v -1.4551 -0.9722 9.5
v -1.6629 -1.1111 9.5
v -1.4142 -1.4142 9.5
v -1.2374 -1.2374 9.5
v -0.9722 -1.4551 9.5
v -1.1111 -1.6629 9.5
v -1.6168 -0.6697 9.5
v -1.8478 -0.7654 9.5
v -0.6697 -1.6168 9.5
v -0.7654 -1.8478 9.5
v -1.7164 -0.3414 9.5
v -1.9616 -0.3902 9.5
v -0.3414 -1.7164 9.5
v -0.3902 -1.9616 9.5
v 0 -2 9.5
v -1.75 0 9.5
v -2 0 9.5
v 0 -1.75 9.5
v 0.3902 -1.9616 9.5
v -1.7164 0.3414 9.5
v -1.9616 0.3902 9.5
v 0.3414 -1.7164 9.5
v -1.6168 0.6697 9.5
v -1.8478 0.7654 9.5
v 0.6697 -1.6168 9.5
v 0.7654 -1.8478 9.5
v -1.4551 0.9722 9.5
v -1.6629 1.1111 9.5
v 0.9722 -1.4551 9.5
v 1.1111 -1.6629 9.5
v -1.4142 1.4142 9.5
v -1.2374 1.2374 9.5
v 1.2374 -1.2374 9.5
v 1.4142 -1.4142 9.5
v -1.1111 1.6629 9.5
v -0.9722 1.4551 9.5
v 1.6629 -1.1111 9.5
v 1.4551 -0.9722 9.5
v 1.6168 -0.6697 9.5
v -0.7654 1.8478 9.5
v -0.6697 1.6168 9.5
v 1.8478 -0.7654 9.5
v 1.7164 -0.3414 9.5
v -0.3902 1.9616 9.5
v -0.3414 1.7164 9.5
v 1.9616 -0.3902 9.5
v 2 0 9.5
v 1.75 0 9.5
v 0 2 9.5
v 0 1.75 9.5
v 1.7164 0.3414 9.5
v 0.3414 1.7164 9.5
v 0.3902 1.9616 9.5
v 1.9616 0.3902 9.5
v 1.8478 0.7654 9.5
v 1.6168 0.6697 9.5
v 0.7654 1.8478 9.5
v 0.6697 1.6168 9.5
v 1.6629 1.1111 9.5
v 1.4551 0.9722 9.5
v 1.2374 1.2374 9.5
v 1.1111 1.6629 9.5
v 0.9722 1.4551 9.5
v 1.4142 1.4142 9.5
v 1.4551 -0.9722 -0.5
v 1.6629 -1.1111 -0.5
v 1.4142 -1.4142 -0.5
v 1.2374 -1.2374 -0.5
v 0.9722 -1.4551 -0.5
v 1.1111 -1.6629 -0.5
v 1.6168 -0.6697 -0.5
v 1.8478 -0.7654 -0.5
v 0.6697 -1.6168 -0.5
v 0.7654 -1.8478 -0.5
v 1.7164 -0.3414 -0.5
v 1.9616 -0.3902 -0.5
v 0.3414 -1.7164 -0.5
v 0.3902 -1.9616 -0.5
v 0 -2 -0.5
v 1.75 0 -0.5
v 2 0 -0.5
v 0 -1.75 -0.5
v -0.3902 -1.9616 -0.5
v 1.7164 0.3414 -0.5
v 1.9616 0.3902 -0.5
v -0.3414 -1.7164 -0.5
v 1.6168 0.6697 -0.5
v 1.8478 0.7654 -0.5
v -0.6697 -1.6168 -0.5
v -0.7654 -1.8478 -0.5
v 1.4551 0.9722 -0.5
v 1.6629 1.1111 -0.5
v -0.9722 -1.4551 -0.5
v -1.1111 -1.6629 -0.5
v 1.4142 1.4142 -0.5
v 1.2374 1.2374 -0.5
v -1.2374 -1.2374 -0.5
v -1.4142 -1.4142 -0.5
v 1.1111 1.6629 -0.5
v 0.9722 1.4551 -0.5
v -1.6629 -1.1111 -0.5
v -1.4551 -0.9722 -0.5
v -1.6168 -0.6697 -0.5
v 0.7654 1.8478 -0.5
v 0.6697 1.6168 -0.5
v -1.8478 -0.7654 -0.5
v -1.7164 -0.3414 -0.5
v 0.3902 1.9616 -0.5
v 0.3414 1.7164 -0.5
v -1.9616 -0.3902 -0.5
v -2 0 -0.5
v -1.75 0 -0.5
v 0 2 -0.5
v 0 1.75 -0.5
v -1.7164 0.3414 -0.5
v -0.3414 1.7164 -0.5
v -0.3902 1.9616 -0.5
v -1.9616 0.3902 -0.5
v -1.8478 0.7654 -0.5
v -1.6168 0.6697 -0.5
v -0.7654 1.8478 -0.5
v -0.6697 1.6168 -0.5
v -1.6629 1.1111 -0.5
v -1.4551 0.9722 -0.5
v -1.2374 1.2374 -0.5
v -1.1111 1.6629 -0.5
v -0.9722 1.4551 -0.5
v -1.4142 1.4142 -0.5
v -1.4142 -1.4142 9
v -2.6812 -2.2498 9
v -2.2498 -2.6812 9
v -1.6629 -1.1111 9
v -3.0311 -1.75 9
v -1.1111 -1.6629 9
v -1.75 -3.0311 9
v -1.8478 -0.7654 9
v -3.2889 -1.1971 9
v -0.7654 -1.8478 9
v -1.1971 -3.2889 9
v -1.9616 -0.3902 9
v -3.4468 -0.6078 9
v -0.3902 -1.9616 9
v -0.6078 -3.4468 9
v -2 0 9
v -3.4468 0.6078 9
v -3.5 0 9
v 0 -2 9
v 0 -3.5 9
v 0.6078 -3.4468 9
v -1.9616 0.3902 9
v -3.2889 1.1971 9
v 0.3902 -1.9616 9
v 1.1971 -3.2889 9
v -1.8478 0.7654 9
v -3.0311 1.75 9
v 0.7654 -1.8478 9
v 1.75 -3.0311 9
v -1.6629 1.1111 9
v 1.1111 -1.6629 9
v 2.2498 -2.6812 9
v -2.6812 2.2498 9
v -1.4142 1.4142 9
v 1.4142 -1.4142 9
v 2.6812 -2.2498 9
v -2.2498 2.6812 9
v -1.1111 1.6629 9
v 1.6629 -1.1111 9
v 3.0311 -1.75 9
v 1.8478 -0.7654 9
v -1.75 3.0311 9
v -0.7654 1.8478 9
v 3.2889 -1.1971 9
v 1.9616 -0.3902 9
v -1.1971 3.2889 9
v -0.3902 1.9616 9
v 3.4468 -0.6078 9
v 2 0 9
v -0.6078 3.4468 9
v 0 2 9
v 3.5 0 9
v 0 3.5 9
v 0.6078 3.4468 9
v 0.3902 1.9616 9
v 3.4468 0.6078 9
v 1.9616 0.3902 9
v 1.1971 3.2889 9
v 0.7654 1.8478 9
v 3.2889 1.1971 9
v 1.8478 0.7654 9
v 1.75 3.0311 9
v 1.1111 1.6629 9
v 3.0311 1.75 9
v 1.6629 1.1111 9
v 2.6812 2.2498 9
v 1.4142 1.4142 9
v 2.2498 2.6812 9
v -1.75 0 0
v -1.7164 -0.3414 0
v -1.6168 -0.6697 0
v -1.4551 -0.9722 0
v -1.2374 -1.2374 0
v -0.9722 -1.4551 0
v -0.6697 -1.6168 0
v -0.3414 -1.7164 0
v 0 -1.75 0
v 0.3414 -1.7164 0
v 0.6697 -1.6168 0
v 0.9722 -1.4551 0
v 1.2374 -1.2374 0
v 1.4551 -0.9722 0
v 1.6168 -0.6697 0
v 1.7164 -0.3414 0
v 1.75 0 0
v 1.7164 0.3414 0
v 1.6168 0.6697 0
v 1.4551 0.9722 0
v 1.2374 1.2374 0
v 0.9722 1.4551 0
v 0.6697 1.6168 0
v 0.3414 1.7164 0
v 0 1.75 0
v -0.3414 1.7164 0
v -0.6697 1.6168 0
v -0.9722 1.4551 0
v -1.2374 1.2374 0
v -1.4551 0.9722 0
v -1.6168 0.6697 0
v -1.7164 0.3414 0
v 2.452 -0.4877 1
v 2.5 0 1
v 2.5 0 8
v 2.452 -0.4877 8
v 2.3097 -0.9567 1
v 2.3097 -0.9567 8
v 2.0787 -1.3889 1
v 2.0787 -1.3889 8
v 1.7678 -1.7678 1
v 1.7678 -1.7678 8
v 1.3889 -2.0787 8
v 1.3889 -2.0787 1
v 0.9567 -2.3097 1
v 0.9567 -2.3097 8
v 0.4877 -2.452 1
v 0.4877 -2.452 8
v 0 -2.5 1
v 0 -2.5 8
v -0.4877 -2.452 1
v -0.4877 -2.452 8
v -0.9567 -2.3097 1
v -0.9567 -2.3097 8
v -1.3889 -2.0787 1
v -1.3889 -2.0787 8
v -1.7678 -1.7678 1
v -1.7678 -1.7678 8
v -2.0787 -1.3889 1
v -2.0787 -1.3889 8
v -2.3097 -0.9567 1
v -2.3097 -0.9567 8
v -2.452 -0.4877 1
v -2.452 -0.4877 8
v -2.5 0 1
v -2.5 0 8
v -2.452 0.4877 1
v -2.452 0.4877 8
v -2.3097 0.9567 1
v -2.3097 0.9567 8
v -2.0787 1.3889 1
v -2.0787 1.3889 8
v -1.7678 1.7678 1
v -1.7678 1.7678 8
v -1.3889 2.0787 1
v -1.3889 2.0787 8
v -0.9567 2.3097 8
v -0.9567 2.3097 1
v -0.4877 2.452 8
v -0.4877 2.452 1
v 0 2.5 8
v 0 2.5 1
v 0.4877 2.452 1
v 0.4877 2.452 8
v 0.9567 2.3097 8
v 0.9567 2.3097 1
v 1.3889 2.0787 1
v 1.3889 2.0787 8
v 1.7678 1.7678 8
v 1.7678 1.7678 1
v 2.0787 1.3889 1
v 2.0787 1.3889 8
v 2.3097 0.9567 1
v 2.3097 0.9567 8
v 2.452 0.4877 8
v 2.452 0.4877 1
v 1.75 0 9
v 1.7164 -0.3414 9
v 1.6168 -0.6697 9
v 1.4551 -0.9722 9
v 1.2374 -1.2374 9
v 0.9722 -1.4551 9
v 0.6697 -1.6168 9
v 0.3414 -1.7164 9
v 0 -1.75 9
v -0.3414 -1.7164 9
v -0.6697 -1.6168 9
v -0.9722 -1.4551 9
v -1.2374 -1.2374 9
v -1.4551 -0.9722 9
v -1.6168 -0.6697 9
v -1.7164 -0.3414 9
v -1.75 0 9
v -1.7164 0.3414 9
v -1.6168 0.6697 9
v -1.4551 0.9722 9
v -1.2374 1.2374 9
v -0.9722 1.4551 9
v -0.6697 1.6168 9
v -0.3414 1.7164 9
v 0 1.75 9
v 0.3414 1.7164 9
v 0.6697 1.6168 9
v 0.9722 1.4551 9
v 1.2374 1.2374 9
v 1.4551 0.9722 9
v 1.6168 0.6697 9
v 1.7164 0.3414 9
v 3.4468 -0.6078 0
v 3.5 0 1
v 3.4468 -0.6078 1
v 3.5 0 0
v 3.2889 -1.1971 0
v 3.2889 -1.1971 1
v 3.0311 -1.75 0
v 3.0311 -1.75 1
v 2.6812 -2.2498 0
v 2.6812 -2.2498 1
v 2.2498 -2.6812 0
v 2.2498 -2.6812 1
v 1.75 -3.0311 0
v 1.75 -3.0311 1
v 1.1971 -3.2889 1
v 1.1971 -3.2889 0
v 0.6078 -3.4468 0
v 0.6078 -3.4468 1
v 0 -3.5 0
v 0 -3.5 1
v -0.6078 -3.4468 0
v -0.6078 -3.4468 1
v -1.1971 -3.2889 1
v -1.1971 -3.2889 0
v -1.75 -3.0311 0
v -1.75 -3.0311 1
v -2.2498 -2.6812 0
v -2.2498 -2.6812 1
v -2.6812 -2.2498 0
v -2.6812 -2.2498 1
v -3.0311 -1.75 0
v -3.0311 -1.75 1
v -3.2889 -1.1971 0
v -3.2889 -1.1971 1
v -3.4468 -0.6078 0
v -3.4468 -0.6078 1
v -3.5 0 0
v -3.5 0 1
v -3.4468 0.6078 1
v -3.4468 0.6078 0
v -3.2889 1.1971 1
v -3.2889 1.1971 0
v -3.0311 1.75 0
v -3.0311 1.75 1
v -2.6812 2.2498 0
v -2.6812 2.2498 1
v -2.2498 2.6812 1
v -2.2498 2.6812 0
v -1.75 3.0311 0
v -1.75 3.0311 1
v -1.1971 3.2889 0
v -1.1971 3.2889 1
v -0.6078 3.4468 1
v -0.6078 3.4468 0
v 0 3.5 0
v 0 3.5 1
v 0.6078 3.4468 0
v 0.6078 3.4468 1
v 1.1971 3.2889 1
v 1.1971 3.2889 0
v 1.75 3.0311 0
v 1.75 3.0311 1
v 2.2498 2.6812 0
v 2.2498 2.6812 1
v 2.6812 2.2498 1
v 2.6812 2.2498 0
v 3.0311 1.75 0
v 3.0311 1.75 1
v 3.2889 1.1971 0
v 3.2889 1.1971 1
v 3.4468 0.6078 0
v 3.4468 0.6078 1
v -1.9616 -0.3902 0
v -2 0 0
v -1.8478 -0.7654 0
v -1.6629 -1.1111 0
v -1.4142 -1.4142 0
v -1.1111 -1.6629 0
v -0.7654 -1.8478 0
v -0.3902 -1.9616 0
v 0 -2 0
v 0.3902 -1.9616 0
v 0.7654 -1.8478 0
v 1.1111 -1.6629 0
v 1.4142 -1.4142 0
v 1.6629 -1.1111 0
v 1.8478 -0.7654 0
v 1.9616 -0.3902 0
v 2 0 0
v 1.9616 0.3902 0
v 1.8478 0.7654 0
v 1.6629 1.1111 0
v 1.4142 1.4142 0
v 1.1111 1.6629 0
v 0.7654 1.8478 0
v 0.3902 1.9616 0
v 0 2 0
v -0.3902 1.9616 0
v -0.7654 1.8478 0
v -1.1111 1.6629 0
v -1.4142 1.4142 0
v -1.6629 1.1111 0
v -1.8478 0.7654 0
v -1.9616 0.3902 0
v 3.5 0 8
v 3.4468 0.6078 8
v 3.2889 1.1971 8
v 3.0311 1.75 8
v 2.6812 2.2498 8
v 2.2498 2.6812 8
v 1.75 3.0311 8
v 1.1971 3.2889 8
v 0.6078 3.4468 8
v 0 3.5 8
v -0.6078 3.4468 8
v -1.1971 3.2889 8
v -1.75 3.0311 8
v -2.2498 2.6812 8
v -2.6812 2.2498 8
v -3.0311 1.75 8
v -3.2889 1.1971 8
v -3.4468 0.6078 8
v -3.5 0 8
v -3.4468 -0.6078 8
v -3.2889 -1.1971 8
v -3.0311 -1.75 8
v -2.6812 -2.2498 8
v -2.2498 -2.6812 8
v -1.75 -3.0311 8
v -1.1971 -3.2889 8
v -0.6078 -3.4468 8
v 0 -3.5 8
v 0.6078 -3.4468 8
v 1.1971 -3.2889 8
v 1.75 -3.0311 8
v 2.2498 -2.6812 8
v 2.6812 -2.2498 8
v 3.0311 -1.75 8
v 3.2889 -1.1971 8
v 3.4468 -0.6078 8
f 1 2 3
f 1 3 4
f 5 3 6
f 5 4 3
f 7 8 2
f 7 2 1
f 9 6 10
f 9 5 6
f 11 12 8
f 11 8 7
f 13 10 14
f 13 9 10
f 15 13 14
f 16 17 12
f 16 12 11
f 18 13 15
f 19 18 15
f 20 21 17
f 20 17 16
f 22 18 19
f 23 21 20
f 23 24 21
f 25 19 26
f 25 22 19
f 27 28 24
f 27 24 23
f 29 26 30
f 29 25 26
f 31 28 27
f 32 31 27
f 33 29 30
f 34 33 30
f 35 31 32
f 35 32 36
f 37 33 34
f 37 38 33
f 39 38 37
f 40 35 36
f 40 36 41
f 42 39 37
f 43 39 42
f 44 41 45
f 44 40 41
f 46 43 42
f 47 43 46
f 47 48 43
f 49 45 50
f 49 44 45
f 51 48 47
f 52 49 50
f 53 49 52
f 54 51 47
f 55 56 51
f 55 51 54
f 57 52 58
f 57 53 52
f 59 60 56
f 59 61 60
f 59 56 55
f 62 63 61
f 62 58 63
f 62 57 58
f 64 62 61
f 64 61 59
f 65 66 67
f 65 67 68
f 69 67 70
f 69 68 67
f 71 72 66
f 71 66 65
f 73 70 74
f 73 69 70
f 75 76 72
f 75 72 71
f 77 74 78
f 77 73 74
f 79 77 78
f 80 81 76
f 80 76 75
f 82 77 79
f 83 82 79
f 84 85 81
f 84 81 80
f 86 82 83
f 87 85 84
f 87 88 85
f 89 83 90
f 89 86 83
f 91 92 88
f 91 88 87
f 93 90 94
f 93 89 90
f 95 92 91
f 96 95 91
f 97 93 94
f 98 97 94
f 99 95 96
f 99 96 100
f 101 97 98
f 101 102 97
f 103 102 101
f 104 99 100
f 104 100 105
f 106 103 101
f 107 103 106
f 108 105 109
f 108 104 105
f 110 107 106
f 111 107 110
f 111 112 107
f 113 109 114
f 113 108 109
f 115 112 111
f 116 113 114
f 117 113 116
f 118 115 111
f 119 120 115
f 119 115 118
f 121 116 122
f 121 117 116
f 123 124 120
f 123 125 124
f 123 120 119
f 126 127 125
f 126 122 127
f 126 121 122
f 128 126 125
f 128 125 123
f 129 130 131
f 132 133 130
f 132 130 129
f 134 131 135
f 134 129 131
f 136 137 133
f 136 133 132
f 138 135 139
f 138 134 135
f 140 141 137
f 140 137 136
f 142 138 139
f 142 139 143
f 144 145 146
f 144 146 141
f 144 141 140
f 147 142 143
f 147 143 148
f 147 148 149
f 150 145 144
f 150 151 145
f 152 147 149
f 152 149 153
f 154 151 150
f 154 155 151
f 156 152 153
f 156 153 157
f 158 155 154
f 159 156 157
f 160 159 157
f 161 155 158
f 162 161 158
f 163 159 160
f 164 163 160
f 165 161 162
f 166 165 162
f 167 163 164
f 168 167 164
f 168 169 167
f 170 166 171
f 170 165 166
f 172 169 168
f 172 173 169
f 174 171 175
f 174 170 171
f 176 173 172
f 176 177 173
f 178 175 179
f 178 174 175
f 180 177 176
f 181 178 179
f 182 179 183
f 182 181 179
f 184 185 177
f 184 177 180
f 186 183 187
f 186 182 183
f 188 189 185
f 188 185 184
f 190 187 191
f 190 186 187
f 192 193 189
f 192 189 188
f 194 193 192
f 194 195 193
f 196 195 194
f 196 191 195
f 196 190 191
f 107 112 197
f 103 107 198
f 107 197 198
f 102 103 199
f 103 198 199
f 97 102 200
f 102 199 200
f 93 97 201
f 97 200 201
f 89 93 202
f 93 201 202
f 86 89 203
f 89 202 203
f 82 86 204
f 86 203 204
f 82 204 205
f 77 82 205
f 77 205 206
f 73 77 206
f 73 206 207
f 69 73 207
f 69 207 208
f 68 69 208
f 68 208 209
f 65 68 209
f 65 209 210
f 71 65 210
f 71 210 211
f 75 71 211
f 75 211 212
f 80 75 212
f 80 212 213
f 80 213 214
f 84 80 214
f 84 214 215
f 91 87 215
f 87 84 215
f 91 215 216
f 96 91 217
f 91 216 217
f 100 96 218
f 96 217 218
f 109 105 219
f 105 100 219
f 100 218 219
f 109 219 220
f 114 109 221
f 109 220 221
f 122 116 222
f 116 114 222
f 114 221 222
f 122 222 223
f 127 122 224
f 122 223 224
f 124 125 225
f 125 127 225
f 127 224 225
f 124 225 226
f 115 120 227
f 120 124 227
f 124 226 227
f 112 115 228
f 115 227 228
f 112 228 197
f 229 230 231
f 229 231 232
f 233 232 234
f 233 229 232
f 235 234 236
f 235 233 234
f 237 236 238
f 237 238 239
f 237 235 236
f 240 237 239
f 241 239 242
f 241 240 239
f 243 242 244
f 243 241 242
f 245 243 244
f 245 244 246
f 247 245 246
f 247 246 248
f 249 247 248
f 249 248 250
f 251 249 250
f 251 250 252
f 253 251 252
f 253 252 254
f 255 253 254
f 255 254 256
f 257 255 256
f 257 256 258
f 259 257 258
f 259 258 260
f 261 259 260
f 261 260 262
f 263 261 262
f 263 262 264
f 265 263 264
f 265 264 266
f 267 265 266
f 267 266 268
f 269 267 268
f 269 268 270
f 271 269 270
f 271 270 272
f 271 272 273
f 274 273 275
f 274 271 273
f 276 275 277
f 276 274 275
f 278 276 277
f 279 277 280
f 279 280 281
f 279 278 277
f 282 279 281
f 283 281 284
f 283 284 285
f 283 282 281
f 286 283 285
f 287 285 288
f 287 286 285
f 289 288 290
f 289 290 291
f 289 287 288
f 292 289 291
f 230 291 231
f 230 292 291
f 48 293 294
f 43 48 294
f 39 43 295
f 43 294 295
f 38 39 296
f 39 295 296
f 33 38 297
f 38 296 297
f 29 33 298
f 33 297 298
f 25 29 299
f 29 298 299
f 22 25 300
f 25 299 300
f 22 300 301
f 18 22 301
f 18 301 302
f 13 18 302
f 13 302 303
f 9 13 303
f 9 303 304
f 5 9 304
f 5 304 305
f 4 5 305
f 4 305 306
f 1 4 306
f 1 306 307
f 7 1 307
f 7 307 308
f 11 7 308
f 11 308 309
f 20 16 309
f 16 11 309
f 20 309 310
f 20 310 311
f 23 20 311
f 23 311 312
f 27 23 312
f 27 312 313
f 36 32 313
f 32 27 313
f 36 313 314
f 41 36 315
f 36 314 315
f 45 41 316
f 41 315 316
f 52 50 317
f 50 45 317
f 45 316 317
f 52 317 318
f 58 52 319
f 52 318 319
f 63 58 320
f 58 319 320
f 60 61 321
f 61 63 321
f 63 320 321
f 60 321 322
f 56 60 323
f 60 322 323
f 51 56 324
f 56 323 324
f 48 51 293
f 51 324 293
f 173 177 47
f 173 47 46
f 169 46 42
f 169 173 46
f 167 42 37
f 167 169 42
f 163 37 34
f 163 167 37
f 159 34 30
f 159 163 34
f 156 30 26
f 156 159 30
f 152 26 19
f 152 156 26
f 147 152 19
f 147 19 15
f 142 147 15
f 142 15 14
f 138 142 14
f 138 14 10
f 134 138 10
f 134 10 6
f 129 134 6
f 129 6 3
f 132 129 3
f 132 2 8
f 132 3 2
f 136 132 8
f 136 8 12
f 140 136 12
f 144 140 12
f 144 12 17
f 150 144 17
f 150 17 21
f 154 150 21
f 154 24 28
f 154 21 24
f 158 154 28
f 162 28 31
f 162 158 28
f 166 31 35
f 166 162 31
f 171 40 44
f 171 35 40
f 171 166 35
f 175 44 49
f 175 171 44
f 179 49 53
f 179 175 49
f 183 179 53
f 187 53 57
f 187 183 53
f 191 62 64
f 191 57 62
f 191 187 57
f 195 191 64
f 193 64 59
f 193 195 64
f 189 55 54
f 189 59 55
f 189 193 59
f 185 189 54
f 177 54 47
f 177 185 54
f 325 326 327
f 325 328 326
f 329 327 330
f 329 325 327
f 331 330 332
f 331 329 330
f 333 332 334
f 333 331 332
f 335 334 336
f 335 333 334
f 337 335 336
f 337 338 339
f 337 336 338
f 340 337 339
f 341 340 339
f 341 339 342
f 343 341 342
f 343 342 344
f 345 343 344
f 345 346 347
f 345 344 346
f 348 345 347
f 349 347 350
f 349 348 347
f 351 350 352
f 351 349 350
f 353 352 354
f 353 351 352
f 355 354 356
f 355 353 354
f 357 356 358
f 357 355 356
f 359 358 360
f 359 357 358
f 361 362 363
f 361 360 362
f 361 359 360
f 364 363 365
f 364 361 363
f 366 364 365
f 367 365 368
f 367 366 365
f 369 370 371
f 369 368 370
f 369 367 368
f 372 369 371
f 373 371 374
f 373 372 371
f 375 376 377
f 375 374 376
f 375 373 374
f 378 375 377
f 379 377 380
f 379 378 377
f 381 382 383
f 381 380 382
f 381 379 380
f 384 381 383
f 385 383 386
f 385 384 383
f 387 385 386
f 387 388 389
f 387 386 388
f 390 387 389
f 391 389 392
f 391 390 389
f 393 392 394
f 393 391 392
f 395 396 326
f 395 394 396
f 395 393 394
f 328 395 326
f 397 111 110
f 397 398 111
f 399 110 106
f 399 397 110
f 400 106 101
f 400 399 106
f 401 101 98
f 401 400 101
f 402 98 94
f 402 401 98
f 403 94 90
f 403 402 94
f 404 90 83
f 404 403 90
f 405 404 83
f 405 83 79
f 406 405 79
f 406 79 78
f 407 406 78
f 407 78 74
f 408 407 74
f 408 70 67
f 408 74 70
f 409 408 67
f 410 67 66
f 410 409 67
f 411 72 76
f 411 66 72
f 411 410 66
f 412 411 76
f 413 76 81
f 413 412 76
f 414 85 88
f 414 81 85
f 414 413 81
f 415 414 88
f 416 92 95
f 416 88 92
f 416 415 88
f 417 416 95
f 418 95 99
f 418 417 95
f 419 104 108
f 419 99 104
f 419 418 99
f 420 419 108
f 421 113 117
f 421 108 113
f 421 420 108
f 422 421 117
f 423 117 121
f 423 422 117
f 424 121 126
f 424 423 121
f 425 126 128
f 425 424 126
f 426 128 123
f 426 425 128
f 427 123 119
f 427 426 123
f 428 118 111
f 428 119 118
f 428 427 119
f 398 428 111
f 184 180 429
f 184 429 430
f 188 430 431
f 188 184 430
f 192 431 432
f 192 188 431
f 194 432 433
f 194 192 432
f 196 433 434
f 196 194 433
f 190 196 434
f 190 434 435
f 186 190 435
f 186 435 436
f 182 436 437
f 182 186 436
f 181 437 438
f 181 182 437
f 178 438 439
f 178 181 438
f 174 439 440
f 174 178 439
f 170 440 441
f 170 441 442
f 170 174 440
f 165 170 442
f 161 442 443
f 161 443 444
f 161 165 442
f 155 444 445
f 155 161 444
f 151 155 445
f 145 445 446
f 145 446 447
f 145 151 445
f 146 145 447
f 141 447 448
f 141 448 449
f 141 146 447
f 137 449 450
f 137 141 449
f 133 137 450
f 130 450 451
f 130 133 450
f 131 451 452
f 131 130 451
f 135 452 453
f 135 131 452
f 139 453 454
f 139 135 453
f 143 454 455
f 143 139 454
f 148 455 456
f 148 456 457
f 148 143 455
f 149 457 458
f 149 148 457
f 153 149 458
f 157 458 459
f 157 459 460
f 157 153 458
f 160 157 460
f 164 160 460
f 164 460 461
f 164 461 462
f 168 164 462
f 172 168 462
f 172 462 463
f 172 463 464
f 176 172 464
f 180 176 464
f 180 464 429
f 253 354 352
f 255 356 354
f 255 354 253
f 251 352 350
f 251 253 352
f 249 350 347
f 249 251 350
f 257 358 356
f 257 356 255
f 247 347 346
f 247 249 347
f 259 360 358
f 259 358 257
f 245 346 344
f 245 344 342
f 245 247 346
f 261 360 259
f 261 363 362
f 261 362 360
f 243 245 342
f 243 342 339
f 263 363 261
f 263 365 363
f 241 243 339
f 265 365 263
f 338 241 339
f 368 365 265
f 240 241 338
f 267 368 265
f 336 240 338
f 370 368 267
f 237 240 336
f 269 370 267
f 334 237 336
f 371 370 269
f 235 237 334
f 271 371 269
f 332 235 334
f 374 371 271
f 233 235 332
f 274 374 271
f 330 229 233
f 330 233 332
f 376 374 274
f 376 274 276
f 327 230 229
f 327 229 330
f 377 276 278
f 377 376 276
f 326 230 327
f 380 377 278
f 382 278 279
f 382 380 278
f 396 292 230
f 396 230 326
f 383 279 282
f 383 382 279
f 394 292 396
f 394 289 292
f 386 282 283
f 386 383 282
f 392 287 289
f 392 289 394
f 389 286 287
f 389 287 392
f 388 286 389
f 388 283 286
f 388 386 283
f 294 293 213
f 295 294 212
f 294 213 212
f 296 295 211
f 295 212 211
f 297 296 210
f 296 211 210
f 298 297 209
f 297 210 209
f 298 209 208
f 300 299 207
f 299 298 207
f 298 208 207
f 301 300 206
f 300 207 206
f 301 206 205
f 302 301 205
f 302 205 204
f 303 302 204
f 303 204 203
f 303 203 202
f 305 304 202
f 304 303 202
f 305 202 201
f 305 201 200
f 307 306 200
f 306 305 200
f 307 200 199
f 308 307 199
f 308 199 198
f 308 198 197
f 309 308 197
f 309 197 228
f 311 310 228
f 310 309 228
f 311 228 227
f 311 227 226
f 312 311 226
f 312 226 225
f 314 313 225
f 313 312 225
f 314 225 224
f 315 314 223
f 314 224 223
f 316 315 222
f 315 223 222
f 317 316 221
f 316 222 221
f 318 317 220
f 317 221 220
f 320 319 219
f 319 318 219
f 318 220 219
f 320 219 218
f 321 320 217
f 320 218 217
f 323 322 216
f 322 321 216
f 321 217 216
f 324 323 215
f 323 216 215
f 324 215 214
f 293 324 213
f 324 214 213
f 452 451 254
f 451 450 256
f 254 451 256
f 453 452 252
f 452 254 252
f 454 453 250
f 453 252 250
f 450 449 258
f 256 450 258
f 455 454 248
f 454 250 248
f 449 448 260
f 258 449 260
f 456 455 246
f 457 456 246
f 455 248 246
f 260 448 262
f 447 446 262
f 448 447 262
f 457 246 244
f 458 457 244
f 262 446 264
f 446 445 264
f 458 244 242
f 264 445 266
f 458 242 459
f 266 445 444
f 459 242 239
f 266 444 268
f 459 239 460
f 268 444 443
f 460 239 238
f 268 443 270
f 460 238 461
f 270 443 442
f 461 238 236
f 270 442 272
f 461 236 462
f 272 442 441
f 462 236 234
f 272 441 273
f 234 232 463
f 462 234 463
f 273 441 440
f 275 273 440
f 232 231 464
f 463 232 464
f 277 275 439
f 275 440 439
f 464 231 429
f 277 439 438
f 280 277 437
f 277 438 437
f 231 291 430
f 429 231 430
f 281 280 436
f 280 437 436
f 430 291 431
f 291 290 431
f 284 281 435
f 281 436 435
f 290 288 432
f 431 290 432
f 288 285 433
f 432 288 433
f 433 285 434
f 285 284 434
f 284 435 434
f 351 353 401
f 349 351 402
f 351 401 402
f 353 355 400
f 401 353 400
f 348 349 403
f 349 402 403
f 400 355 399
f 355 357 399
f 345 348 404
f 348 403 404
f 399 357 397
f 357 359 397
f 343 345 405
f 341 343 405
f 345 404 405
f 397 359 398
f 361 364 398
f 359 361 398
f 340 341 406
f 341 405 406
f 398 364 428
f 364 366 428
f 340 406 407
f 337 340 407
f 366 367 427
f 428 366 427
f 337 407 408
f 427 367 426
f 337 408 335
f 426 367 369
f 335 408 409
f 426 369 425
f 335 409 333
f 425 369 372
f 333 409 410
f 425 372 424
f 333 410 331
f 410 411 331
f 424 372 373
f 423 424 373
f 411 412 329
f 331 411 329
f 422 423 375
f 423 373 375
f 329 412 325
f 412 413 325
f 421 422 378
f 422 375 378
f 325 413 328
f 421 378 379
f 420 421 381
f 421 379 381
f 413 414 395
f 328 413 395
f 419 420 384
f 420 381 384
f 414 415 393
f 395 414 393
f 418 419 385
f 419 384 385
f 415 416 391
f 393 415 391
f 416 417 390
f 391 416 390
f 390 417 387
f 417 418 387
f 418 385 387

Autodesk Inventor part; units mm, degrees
ref_plane "YZ Plane" through (0, 0, 0) normal (1, 0, 0) x (0, 1, 0)
ref_plane "XZ Plane" through (0, 0, 0) normal (0, 1, 0) x (-1, 0, 0)
ref_plane "XY Plane" through (0, 0, 0) normal (0, 0, 1) x (1, 0, 0)
sketch "Sketch1" plane through (0, 0, 0) normal (0, 0, 1) x (1, 0, 0)
  circle A0 centre (0, 0) radius 1.75
  circle A1 centre (0, 0) radius 3.5
  circle A2 centre (0, 0) radius 2.5
  dimension "d0" = 3.5
  dimension "d1" = 7
  dimension "d9" = 5
extrude "Extrusion1" add sketch "Sketch1" along normal blind 9 contours A2
extrude "Extrusion2" add sketch "Sketch1" along normal blind 1 contours A1 | A2
sketch "Sketch2" plane through (0, 0, 9) normal (0, 0, 1) x (1, 0, 0)
  circle A0 centre (0, 0) radius 3.5
  circle A1 centre (0, 0) radius 1.75
  dimension "d6" = 7
  dimension "d10" = 3.5
extrude "Extrusion3" add sketch "Sketch2" against normal blind 1
sketch "Sketch3" plane through (0, 0, 0) normal (0, 0, -1) x (-1, 0, 0)
  circle A0 centre (0, 0) radius 2
  circle A1 centre (0, 0) radius 1.75
  dimension "d11" = 4
  dimension "d12" = 3.5
extrude "Extrusion4" add sketch "Sketch3" along normal blind 0.5
sketch "Sketch4" plane through (0, 0, 9) normal (0, 0, 1) x (1, 0, 0)
  circle A0 centre (0, 0) radius 1.75
  circle A1 centre (0, 0) radius 1.75 projected
  circle A2 centre (0, 0) radius 2
  dimension "d15" = 3.5
  dimension "d16" = 4
extrude "Extrusion5" add sketch "Sketch4" along normal blind 0.5
properties part number "GuidingPulley"
